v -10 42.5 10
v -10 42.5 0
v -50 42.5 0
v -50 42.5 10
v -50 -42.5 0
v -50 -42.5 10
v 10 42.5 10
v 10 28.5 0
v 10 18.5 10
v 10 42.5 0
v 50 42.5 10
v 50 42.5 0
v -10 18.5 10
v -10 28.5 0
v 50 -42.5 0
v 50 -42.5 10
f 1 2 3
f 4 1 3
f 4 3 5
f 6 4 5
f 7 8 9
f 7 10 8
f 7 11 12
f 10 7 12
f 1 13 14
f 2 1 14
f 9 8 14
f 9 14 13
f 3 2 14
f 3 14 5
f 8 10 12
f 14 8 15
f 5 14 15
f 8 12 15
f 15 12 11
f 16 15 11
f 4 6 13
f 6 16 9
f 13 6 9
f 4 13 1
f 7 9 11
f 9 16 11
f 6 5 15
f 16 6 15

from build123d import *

# Parameters (mm, degrees)
BOSS_EXTRU_1_DEPTH      = 10
ENL_V_MAT_EXTRU_1_DEPTH = 60
BOSS_EXTRU_2_DEPTH      = 40
ESQUISSE5_W             = 10
ESQUISSE5_H             = 30
BOSS_EXTRU_3_DEPTH      = 60
ESQUISSE6_W             = 10
ESQUISSE6_H             = 14
ENL_V_MAT_EXTRU_2_DEPTH = 60
ESQUISSE9_W             = 10
ESQUISSE9_H             = 14
BOSS_EXTRU_4_DEPTH      = 40
ENL_V_MAT_EXTRU_3_DEPTH = 60
BOSS_EXTRU_5_DEPTH      = 40
ESQUISSE13_W            = 10
ESQUISSE13_H            = 31.398637822
BOSS_EXTRU_6_DEPTH      = 60
ENL_V_MAT_EXTRU_9_DEPTH = 60
BOSS_EXTRU_7_DEPTH      = 40


with BuildPart() as part:
    # Esquisse1 → Boss.-Extru.1 (new body)
    with BuildSketch(Plane.XY):
        Polygon((-50, -42.5), (50, -42.5), (50, 42.5), (10, 42.5), (10, 28.5), (0, 28.5), (-10, 28.5), (-10, 42.5), (-50, 42.5), align=None)
    extrude(amount=BOSS_EXTRU_1_DEPTH)

    # Esquisse2 → Enlèv. mat.-Extru.1 (cut)
    with BuildSketch(Plane(origin=(50, 0, 0), x_dir=(0, 0, -1), z_dir=(1, 0, 0))):
        Polygon((-10, 28.5), (0, 18.5), (0, 28.5), align=None)
    extrude(amount=-ENL_V_MAT_EXTRU_1_DEPTH, mode=Mode.SUBTRACT)


with BuildPart() as enl_v_mat_extru_1_piece_1:
    # of the separate pieces the step leaves, piece 1, a body of its own (enl_v_mat_extru_1_pieces)
    add(part.part.solids().sort_by_distance((-50, -42.5, 0))[0])



with BuildPart() as enl_v_mat_extru_1_piece_2:
    # of the separate pieces the step leaves, piece 2, a body of its own (enl_v_mat_extru_1_pieces)
    add(part.part.solids().sort_by_distance((10, 42.5, 10))[0])


with BuildPart() as enl_v_mat_extru_1_piece_1_1:
    add(enl_v_mat_extru_1_piece_1.part)

    add(enl_v_mat_extru_1_piece_2.part)  # Boss.-Extru.2 merges Enlèv. mat.-Extru.1 piece 2
    # Esquisse4 → Boss.-Extru.2 (add)
    with BuildSketch(Plane(origin=(50, 0, 0), x_dir=(0, 0, -1), z_dir=(1, 0, 0))):
        Polygon((-10, 28.5), (0, 18.5), (0, 28.5), align=None)
    extrude(amount=-BOSS_EXTRU_2_DEPTH)

    # Esquisse5 → Boss.-Extru.3 (add)
    with BuildSketch(Plane(origin=(50, 0, 0), x_dir=(0, 0, -1), z_dir=(1, 0, 0))):
        with Locations((-5, 27.5)):
            Rectangle(ESQUISSE5_W, ESQUISSE5_H)
    extrude(amount=-BOSS_EXTRU_3_DEPTH)

    # Esquisse6 → Enlèv. mat.-Extru.2 (cut)
    with BuildSketch(Plane(origin=(50, 0, 0), x_dir=(0, 0, -1), z_dir=(1, 0, 0))):
        with Locations((-5, 35.5)):
            Rectangle(ESQUISSE6_W, ESQUISSE6_H)
    extrude(amount=-ENL_V_MAT_EXTRU_2_DEPTH, mode=Mode.SUBTRACT)

    # Esquisse9 → Boss.-Extru.4 (add)
    with BuildSketch(Plane(origin=(50, 0, 0), x_dir=(0, 0, -1), z_dir=(1, 0, 0))):
        with Locations((-5, 35.5)):
            Rectangle(ESQUISSE9_W, ESQUISSE9_H)
    extrude(amount=-BOSS_EXTRU_4_DEPTH)

    # Esquisse11 → Enlèv. mat.-Extru.3 (cut)
    with BuildSketch(Plane(origin=(50, 0, 0), x_dir=(0, 0, -1), z_dir=(1, 0, 0))):
        Polygon((0, 18.5), (0, 28.5), (-10, 28.5), align=None)
    extrude(amount=-ENL_V_MAT_EXTRU_3_DEPTH, mode=Mode.SUBTRACT)


with BuildPart() as enl_v_mat_extru_3_piece_1:
    # of the separate pieces the step leaves, piece 1, a body of its own (enl_v_mat_extru_3_pieces)
    add(enl_v_mat_extru_1_piece_1_1.part.solids().sort_by_distance((-10, 28.5, 10))[0])



with BuildPart() as enl_v_mat_extru_3_piece_2:
    # of the separate pieces the step leaves, piece 2, a body of its own (enl_v_mat_extru_3_pieces)
    add(enl_v_mat_extru_1_piece_1_1.part.solids().sort_by_distance((10, 42.5, 10))[0])


with BuildPart() as enl_v_mat_extru_3_piece_1_1:
    add(enl_v_mat_extru_3_piece_1.part)

    add(enl_v_mat_extru_3_piece_2.part)  # Boss.-Extru.5 merges Enlèv. mat.-Extru.3 piece 2
    # Esquisse12 → Boss.-Extru.5 (add)
    with BuildSketch(Plane(origin=(50, 0, 0), x_dir=(0, 0, -1), z_dir=(1, 0, 0))):
        Polygon((-10, 28.5), (0, 28.5), (0, 18.5), align=None)
    extrude(amount=-BOSS_EXTRU_5_DEPTH)

    # Esquisse13 → Boss.-Extru.6 (add)
    with BuildSketch(Plane(origin=(50, 0, 0), x_dir=(0, 0, -1), z_dir=(1, 0, 0))):
        with Locations((-5, 12.800681089)):
            Rectangle(ESQUISSE13_W, ESQUISSE13_H)
    extrude(amount=-BOSS_EXTRU_6_DEPTH)

    # Esquisse16 → Enlèv. mat.-Extru.9 (cut)
    with BuildSketch(Plane(origin=(50, 0, 0), x_dir=(0, 0, -1), z_dir=(1, 0, 0))):
        Polygon((-10, 28.5), (0, 28.5), (-10, 18.5), align=None)
    extrude(amount=-ENL_V_MAT_EXTRU_9_DEPTH, mode=Mode.SUBTRACT)


with BuildPart() as enl_v_mat_extru_9_piece_1:
    # of the separate pieces the step leaves, piece 1, a body of its own (enl_v_mat_extru_9_pieces)
    add(enl_v_mat_extru_3_piece_1_1.part.solids().sort_by_distance((50, -42.5, 10))[0])



with BuildPart() as enl_v_mat_extru_9_piece_2:
    # of the separate pieces the step leaves, piece 2, a body of its own (enl_v_mat_extru_9_pieces)
    add(enl_v_mat_extru_3_piece_1_1.part.solids().sort_by_distance((50, 28.5, 10))[0])


with BuildPart() as enl_v_mat_extru_9_piece_1_1:
    add(enl_v_mat_extru_9_piece_1.part)

    add(enl_v_mat_extru_9_piece_2.part)  # Boss.-Extru.7 merges Enlèv. mat.-Extru.9 piece 2
    # Esquisse17 → Boss.-Extru.7 (add)
    with BuildSketch(Plane(origin=(50, 0, 0), x_dir=(0, 0, -1), z_dir=(1, 0, 0))):
        Polygon((-10, 28.5), (0, 28.5), (-10, 18.5), align=None)
    extrude(amount=-BOSS_EXTRU_7_DEPTH)


solid = enl_v_mat_extru_9_piece_1_1.part
